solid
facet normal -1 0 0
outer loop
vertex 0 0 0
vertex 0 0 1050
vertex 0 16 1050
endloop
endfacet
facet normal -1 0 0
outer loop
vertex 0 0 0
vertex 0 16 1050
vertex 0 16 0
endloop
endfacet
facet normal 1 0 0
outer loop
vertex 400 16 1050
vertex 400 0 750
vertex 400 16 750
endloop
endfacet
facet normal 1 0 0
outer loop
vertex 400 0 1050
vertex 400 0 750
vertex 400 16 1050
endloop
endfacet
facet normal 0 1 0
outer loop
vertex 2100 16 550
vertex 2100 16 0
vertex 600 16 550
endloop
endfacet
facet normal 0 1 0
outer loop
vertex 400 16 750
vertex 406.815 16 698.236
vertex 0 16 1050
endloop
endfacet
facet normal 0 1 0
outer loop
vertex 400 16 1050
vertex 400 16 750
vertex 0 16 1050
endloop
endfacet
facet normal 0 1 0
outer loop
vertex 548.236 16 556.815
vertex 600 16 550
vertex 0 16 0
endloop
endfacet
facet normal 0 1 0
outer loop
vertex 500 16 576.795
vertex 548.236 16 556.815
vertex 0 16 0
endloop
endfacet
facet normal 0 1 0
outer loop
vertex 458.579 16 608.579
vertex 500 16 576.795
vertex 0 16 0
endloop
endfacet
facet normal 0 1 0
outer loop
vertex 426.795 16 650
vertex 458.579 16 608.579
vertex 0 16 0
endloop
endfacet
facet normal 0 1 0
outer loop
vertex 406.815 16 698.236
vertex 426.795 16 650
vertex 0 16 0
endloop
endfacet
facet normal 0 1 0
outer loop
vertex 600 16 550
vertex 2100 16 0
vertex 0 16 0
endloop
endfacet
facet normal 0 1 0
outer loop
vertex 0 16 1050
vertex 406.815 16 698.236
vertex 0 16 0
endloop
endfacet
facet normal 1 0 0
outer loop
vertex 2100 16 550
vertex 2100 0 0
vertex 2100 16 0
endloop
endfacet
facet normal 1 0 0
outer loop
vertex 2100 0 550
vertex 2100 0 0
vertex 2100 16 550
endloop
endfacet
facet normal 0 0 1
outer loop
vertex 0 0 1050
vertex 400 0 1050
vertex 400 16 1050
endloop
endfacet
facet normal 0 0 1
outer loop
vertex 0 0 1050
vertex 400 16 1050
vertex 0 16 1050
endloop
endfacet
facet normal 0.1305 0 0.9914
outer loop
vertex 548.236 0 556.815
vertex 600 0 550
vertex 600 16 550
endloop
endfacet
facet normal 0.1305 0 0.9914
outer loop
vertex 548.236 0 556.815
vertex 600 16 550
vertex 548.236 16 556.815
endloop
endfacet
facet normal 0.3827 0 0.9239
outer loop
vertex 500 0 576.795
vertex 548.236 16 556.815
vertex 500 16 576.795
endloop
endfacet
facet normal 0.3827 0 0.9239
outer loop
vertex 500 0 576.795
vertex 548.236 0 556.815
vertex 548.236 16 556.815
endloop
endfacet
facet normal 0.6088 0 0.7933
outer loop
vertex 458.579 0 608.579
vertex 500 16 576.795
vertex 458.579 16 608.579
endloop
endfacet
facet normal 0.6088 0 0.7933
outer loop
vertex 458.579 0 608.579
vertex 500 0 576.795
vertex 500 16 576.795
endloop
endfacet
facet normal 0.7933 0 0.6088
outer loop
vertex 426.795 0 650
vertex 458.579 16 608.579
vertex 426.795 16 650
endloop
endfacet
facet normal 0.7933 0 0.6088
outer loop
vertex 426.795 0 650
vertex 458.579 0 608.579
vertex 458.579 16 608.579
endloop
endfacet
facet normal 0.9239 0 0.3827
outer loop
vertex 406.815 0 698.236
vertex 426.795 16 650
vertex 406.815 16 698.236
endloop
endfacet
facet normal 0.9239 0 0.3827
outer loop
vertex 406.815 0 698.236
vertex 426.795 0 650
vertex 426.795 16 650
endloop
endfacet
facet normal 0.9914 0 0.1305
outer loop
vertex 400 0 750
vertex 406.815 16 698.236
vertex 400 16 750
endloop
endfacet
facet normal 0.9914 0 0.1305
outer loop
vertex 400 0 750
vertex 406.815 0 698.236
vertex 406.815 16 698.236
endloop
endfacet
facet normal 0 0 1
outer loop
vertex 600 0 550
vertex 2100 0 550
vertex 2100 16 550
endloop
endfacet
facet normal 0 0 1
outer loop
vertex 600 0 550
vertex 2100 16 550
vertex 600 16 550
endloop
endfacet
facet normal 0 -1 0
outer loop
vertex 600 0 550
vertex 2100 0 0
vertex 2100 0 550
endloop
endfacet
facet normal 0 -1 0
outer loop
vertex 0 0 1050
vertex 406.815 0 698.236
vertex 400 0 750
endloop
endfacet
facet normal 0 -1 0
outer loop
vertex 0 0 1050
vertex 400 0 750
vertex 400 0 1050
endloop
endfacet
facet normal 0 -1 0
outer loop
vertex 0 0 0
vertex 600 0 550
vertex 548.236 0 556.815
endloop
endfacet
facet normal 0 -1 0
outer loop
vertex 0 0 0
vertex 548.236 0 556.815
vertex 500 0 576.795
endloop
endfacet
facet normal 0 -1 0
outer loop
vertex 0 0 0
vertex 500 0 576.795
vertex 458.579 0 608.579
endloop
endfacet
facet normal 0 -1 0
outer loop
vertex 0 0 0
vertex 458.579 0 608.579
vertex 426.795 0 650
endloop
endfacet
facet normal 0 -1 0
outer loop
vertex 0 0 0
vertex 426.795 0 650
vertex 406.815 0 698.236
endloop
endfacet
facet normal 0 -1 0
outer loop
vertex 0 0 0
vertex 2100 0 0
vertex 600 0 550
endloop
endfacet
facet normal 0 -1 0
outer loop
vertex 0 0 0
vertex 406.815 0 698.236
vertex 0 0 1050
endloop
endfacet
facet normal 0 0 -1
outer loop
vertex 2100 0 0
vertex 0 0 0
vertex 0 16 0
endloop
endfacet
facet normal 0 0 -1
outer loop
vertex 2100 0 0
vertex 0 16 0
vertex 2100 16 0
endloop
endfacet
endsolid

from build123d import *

# Parameters (mm, degrees)
AUFSATZ_LINEAR_AUSTRAGEN1_DEPTH = 16


with BuildPart() as part:
    # Skizze1 → Aufsatz-Linear austragen1 (new body)
    with BuildSketch(Plane(origin=(0, 0, 0), x_dir=(1, 0, 0), z_dir=(0, 1, 0))):
        with BuildLine():
            Line((0, 0), (2100, 0))
            Line((2100, 0), (2100, -550))
            Line((2100, -550), (600, -550))
            ThreePointArc((600, -550), (458.578643763, -608.578643763), (400, -750))
            Line((400, -750), (400, -1050))
            Line((400, -1050), (0, -1050))
            Line((0, -1050), (0, 0))
        make_face()
    extrude(amount=AUFSATZ_LINEAR_AUSTRAGEN1_DEPTH)


solid = part.part
